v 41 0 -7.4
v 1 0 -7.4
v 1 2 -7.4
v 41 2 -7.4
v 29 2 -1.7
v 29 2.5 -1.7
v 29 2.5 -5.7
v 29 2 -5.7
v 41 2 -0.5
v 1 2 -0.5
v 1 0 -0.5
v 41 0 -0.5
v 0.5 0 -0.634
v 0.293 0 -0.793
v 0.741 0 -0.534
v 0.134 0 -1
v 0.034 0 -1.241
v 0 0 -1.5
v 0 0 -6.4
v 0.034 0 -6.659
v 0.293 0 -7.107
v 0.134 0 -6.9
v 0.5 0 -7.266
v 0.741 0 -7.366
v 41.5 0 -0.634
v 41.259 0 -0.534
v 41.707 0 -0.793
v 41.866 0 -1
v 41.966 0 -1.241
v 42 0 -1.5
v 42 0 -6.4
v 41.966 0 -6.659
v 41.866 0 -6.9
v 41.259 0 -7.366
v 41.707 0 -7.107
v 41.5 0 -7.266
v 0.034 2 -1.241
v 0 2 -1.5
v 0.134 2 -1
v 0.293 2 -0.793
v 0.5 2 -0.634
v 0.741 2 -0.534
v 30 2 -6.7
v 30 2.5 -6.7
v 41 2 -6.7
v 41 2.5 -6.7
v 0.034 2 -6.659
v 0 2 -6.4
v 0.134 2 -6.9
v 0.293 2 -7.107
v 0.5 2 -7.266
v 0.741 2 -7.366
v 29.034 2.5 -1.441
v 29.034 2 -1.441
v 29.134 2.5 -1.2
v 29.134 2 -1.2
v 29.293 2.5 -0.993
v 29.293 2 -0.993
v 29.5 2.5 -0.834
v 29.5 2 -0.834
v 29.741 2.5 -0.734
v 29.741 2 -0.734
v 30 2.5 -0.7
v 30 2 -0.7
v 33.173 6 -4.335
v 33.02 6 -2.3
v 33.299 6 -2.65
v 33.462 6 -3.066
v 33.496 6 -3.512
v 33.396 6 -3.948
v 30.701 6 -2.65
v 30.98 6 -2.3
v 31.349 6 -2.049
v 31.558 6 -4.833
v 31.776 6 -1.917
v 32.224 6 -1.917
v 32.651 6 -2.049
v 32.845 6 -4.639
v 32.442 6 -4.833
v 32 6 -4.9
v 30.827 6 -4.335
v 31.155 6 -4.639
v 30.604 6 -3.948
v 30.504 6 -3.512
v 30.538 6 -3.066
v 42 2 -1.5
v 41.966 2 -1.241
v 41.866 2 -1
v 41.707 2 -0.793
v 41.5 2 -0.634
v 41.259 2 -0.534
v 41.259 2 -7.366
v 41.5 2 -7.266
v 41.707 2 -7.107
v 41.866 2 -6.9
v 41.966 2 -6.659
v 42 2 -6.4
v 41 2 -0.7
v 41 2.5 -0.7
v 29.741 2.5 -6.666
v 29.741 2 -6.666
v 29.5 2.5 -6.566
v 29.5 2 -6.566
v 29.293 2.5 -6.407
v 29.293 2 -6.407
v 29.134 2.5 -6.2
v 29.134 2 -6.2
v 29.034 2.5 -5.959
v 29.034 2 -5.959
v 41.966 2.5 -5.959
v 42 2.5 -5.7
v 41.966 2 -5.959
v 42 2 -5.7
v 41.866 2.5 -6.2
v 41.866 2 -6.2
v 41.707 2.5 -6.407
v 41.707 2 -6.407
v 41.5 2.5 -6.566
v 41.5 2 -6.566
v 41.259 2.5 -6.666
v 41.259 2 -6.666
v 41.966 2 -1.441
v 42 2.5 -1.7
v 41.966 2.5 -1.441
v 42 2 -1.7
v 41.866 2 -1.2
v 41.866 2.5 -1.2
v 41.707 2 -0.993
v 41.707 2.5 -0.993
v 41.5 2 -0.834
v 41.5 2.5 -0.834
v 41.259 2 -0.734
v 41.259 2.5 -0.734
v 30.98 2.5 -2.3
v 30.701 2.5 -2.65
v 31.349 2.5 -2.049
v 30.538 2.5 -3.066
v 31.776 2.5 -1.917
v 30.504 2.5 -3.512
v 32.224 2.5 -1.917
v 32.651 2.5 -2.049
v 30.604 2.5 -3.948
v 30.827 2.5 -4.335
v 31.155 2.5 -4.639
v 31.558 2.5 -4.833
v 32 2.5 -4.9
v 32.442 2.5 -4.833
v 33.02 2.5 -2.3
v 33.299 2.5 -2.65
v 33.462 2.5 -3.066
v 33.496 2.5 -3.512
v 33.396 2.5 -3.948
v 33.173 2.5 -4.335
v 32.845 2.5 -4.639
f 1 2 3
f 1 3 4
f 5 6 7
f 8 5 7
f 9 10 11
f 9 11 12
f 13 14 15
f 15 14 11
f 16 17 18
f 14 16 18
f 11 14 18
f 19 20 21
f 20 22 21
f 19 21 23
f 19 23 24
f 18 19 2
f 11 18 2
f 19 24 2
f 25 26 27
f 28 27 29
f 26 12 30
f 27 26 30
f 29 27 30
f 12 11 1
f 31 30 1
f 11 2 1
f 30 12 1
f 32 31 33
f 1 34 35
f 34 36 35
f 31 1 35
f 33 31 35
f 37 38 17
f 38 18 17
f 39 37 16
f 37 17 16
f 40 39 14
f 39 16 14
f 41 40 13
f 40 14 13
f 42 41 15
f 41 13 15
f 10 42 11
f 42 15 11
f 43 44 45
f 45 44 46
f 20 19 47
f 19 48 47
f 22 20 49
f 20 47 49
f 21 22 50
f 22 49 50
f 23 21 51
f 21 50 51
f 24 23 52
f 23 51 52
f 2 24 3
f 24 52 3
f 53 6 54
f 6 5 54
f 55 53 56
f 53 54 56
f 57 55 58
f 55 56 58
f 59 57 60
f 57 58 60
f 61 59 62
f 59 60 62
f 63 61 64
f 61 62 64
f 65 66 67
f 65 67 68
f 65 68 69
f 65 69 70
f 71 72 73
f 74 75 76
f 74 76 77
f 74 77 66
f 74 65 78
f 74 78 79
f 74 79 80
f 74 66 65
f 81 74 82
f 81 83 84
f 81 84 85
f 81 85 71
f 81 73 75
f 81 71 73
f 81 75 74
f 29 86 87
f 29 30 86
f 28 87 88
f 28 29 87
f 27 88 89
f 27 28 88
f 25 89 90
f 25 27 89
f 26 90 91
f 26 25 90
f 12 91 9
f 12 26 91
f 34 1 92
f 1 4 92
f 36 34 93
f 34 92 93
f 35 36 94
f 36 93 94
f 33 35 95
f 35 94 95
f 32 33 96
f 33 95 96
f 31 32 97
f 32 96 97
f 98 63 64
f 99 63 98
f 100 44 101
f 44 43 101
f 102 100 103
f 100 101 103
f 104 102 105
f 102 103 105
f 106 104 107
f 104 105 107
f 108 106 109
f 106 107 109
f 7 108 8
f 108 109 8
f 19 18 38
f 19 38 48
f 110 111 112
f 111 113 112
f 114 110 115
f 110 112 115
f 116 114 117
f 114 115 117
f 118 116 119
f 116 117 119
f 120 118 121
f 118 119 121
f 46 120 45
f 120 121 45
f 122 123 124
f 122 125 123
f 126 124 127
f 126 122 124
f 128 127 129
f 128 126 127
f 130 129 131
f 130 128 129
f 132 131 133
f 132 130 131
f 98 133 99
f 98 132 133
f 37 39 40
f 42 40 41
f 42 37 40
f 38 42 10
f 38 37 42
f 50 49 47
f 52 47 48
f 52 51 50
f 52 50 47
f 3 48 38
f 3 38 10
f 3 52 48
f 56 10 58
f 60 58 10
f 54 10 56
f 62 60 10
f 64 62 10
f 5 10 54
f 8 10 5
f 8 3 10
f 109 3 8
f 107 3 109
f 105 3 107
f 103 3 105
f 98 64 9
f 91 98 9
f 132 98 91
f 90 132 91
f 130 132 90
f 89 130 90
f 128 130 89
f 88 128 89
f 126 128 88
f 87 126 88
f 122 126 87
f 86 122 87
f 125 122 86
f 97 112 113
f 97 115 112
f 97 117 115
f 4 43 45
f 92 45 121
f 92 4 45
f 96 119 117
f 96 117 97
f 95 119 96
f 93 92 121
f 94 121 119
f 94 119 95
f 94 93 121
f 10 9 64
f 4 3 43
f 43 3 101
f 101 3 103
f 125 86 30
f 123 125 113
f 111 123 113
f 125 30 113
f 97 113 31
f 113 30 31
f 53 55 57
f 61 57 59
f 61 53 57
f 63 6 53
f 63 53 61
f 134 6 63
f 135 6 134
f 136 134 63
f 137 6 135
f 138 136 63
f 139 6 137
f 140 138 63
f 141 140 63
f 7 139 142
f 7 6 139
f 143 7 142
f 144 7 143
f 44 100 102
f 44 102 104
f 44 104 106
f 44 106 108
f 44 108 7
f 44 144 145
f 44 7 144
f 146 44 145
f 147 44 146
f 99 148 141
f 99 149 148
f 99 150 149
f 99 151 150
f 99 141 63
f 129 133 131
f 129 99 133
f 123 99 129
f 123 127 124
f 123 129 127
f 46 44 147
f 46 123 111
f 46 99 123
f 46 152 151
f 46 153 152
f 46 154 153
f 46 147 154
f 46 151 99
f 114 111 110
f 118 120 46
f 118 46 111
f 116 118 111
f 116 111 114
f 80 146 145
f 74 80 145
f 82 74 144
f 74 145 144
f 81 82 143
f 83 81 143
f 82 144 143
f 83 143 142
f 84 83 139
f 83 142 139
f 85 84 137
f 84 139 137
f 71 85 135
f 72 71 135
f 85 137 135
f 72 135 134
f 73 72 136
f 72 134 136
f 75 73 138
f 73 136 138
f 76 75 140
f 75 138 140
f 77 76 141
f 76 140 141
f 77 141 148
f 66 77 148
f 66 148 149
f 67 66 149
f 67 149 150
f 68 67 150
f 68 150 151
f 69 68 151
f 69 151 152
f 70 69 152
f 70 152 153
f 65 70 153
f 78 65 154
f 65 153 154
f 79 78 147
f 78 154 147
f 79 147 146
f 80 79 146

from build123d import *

# Parameters (mm, degrees)
SKETCH_1_W          = 42
SKETCH_1_H          = 7.4
EXTRUDE_1_DEPTH     = 2.5
SKETCH_2_R          = 1.5
EXTRUDE_2_DEPTH     = 3.5
SKETCH_3_W          = 29
SKETCH_3_H          = 7.4
CUT_EXTRUDE_1_DEPTH = 0.5
SKETCH_4_W          = 13
SKETCH_4_H          = 0.7
CUT_EXTRUDE_2_DEPTH = 0.5
CUT_EXTRUDE_3_REACH = 44.834
SKETCH_5_W          = 42
SKETCH_5_H          = 0.5
FILLET_1_R          = 1
FILLET_2_R          = 1


with BuildPart() as part:
    # 草图1 → 凸台-拉伸1 (new body)
    with BuildSketch(Plane(origin=(0, 0, 0), x_dir=(1, 0, 0), z_dir=(0, 1, 0))):
        with Locations((21, 3.7)):
            Rectangle(SKETCH_1_W, SKETCH_1_H)
    extrude(amount=EXTRUDE_1_DEPTH)

    # 草图2 → 凸台-拉伸2 (add)
    with BuildSketch(Plane(origin=(0, 2.5, 0), x_dir=(1, 0, 0), z_dir=(0, 1, 0))):
        with Locations(Location((32, 3.4, 0), (0, 0, 90))):
            Circle(SKETCH_2_R)
    extrude(amount=EXTRUDE_2_DEPTH)

    # 草图3 → 切除-拉伸1 (cut)
    with BuildSketch(Plane(origin=(0, 2.5, 0), x_dir=(1, 0, 0), z_dir=(0, 1, 0))):
        with Locations((14.5, 3.7)):
            Rectangle(SKETCH_3_W, SKETCH_3_H)
    extrude(amount=-CUT_EXTRUDE_1_DEPTH, mode=Mode.SUBTRACT)

    # 草图4 → 切除-拉伸2 (cut)
    with BuildSketch(Plane(origin=(0, 2.5, 0), x_dir=(1, 0, 0), z_dir=(0, 1, 0))):
        with Locations((35.5, 7.05)):
            Rectangle(SKETCH_4_W, SKETCH_4_H)
        with Locations((35.5, 0.35)):
            Rectangle(SKETCH_4_W, SKETCH_4_H)
    extrude(amount=-CUT_EXTRUDE_2_DEPTH, mode=Mode.SUBTRACT)

    # 草图5 → 切除-拉伸3 (cut, up to next)
    with BuildSketch(Plane(origin=(0, 2, 0), x_dir=(1, 0, 0), z_dir=(0, 1, 0)), mode=Mode.PRIVATE) as cut_extrude_3_sk1:
        with Locations((21, 0.25)):
            Rectangle(SKETCH_5_W, SKETCH_5_H)
    cut_extrude_3_tool1 = extrude(cut_extrude_3_sk1.sketch, amount=-CUT_EXTRUDE_3_REACH, mode=Mode.PRIVATE) & part.part
    add(cut_extrude_3_tool1.solids().sort_by_distance((21, 2, -0.25))[0], mode=Mode.SUBTRACT)

    # 圆角1
    fillet_1_edges = [part.edges().sort_by_distance(p)[0] for p in [
        (0, 1, -7.4),
        (29, 2.25, -6.7),
        (42, 2.25, -6.7),
        (29, 2.25, -0.7),
        (42, 2.25, -0.7),
        (0, 1, -0.5),
    ]]
    fillet(fillet_1_edges, radius=FILLET_1_R)

    # 圆角2
    fillet_2_edges = [part.edges().sort_by_distance(p)[0] for p in [
        (42, 1, -7.4),
        (42, 1, -0.5),
    ]]
    fillet(fillet_2_edges, radius=FILLET_2_R)


solid = part.part
